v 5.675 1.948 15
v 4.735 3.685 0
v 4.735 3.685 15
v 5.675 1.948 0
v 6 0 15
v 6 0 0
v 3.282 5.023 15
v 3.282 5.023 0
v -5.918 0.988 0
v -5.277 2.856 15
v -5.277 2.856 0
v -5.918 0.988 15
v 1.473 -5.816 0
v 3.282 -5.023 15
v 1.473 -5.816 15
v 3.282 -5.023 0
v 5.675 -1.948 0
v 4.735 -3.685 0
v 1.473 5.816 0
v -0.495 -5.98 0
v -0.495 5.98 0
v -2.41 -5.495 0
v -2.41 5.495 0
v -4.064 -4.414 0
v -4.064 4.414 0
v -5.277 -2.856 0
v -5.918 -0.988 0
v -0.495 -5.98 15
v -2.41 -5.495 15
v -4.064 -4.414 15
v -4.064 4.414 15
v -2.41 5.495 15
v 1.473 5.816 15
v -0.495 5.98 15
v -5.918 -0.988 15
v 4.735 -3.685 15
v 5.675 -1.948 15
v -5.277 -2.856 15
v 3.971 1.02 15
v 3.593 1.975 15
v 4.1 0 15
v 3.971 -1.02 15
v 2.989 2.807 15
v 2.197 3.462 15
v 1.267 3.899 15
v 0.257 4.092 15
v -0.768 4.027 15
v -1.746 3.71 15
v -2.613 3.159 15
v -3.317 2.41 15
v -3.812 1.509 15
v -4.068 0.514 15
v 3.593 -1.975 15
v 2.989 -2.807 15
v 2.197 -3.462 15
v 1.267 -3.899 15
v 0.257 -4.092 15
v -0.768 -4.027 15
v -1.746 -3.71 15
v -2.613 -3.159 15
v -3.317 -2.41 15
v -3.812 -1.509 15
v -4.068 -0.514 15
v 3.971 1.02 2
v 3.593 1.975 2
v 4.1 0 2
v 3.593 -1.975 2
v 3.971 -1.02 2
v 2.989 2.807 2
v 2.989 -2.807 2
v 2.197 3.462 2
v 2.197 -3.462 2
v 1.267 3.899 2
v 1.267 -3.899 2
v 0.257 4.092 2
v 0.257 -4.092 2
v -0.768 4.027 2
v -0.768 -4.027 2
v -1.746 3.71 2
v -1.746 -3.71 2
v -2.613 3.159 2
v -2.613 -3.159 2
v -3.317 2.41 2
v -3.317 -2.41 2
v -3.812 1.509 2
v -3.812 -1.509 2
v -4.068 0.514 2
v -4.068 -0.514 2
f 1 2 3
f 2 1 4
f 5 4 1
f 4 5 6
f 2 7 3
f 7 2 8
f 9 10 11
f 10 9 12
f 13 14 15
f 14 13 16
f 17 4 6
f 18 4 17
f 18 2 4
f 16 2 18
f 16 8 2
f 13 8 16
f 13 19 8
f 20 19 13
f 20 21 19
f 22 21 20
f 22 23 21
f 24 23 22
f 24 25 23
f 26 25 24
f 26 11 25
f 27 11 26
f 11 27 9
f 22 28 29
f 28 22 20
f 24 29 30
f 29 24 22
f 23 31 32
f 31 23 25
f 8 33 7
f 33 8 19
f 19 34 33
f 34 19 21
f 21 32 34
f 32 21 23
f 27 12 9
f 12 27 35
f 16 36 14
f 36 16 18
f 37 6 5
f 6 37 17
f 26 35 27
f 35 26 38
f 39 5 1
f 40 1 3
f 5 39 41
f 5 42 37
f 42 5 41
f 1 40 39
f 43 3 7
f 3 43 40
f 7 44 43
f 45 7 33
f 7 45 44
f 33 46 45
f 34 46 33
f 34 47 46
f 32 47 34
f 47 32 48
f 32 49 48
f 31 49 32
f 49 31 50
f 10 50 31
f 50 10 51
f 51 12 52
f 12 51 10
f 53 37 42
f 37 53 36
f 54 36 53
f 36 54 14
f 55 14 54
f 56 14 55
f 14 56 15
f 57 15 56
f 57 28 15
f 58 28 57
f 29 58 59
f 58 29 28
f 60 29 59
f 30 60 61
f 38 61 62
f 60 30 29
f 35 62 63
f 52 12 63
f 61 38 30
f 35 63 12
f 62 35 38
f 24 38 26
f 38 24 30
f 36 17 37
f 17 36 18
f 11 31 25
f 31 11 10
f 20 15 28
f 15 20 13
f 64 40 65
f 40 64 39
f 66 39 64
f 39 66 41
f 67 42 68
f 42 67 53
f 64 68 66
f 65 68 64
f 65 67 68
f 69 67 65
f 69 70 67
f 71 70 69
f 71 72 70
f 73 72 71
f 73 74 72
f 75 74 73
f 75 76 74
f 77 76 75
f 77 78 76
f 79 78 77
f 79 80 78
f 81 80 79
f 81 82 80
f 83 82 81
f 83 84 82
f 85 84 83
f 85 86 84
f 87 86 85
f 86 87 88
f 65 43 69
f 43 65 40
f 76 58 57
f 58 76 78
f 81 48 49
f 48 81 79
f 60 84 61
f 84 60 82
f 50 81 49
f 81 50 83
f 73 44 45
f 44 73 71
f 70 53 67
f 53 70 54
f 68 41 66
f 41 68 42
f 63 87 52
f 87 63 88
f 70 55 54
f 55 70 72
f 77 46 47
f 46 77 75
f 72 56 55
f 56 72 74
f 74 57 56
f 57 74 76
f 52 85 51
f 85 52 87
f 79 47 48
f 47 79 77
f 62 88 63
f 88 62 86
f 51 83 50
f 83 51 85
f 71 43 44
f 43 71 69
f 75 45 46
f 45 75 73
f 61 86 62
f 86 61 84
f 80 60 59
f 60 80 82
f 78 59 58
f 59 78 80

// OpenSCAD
// file: rails.scad
// Rail and Bearing

linear_rail_negative_add = 0.2;
linear_rail_diameter = 8;
linear_rail_length = 506;
module rail() {
    color([1/2,1/2,1/2])
        cylinder(d = linear_rail_diameter, h = linear_rail_length, $fn=25);
}

module rail_negative() {
    color([1/2,1/2,1/2])
        cylinder(d = linear_rail_diameter+linear_rail_negative_add, h = linear_rail_length, $fn=25);
}

bearing_height = 24;
bearing_outer_diameter = 15;
bearing_innter_diameter = 8;
module bearing() {
    color([1/2,1/2,1/2])
    difference() {
        cylinder(h = bearing_height, d = bearing_outer_diameter, $fn=25);
        translate([0,0,-1])
            cylinder(h = bearing_height+2, d = bearing_innter_diameter, $fn=25);
    }
}
// main file
// Rail Test Fit

include <rails.scad>

difference() {
    cylinder(r=6,h=15);

    translate([0,0,2])
        rail_negative();
}
